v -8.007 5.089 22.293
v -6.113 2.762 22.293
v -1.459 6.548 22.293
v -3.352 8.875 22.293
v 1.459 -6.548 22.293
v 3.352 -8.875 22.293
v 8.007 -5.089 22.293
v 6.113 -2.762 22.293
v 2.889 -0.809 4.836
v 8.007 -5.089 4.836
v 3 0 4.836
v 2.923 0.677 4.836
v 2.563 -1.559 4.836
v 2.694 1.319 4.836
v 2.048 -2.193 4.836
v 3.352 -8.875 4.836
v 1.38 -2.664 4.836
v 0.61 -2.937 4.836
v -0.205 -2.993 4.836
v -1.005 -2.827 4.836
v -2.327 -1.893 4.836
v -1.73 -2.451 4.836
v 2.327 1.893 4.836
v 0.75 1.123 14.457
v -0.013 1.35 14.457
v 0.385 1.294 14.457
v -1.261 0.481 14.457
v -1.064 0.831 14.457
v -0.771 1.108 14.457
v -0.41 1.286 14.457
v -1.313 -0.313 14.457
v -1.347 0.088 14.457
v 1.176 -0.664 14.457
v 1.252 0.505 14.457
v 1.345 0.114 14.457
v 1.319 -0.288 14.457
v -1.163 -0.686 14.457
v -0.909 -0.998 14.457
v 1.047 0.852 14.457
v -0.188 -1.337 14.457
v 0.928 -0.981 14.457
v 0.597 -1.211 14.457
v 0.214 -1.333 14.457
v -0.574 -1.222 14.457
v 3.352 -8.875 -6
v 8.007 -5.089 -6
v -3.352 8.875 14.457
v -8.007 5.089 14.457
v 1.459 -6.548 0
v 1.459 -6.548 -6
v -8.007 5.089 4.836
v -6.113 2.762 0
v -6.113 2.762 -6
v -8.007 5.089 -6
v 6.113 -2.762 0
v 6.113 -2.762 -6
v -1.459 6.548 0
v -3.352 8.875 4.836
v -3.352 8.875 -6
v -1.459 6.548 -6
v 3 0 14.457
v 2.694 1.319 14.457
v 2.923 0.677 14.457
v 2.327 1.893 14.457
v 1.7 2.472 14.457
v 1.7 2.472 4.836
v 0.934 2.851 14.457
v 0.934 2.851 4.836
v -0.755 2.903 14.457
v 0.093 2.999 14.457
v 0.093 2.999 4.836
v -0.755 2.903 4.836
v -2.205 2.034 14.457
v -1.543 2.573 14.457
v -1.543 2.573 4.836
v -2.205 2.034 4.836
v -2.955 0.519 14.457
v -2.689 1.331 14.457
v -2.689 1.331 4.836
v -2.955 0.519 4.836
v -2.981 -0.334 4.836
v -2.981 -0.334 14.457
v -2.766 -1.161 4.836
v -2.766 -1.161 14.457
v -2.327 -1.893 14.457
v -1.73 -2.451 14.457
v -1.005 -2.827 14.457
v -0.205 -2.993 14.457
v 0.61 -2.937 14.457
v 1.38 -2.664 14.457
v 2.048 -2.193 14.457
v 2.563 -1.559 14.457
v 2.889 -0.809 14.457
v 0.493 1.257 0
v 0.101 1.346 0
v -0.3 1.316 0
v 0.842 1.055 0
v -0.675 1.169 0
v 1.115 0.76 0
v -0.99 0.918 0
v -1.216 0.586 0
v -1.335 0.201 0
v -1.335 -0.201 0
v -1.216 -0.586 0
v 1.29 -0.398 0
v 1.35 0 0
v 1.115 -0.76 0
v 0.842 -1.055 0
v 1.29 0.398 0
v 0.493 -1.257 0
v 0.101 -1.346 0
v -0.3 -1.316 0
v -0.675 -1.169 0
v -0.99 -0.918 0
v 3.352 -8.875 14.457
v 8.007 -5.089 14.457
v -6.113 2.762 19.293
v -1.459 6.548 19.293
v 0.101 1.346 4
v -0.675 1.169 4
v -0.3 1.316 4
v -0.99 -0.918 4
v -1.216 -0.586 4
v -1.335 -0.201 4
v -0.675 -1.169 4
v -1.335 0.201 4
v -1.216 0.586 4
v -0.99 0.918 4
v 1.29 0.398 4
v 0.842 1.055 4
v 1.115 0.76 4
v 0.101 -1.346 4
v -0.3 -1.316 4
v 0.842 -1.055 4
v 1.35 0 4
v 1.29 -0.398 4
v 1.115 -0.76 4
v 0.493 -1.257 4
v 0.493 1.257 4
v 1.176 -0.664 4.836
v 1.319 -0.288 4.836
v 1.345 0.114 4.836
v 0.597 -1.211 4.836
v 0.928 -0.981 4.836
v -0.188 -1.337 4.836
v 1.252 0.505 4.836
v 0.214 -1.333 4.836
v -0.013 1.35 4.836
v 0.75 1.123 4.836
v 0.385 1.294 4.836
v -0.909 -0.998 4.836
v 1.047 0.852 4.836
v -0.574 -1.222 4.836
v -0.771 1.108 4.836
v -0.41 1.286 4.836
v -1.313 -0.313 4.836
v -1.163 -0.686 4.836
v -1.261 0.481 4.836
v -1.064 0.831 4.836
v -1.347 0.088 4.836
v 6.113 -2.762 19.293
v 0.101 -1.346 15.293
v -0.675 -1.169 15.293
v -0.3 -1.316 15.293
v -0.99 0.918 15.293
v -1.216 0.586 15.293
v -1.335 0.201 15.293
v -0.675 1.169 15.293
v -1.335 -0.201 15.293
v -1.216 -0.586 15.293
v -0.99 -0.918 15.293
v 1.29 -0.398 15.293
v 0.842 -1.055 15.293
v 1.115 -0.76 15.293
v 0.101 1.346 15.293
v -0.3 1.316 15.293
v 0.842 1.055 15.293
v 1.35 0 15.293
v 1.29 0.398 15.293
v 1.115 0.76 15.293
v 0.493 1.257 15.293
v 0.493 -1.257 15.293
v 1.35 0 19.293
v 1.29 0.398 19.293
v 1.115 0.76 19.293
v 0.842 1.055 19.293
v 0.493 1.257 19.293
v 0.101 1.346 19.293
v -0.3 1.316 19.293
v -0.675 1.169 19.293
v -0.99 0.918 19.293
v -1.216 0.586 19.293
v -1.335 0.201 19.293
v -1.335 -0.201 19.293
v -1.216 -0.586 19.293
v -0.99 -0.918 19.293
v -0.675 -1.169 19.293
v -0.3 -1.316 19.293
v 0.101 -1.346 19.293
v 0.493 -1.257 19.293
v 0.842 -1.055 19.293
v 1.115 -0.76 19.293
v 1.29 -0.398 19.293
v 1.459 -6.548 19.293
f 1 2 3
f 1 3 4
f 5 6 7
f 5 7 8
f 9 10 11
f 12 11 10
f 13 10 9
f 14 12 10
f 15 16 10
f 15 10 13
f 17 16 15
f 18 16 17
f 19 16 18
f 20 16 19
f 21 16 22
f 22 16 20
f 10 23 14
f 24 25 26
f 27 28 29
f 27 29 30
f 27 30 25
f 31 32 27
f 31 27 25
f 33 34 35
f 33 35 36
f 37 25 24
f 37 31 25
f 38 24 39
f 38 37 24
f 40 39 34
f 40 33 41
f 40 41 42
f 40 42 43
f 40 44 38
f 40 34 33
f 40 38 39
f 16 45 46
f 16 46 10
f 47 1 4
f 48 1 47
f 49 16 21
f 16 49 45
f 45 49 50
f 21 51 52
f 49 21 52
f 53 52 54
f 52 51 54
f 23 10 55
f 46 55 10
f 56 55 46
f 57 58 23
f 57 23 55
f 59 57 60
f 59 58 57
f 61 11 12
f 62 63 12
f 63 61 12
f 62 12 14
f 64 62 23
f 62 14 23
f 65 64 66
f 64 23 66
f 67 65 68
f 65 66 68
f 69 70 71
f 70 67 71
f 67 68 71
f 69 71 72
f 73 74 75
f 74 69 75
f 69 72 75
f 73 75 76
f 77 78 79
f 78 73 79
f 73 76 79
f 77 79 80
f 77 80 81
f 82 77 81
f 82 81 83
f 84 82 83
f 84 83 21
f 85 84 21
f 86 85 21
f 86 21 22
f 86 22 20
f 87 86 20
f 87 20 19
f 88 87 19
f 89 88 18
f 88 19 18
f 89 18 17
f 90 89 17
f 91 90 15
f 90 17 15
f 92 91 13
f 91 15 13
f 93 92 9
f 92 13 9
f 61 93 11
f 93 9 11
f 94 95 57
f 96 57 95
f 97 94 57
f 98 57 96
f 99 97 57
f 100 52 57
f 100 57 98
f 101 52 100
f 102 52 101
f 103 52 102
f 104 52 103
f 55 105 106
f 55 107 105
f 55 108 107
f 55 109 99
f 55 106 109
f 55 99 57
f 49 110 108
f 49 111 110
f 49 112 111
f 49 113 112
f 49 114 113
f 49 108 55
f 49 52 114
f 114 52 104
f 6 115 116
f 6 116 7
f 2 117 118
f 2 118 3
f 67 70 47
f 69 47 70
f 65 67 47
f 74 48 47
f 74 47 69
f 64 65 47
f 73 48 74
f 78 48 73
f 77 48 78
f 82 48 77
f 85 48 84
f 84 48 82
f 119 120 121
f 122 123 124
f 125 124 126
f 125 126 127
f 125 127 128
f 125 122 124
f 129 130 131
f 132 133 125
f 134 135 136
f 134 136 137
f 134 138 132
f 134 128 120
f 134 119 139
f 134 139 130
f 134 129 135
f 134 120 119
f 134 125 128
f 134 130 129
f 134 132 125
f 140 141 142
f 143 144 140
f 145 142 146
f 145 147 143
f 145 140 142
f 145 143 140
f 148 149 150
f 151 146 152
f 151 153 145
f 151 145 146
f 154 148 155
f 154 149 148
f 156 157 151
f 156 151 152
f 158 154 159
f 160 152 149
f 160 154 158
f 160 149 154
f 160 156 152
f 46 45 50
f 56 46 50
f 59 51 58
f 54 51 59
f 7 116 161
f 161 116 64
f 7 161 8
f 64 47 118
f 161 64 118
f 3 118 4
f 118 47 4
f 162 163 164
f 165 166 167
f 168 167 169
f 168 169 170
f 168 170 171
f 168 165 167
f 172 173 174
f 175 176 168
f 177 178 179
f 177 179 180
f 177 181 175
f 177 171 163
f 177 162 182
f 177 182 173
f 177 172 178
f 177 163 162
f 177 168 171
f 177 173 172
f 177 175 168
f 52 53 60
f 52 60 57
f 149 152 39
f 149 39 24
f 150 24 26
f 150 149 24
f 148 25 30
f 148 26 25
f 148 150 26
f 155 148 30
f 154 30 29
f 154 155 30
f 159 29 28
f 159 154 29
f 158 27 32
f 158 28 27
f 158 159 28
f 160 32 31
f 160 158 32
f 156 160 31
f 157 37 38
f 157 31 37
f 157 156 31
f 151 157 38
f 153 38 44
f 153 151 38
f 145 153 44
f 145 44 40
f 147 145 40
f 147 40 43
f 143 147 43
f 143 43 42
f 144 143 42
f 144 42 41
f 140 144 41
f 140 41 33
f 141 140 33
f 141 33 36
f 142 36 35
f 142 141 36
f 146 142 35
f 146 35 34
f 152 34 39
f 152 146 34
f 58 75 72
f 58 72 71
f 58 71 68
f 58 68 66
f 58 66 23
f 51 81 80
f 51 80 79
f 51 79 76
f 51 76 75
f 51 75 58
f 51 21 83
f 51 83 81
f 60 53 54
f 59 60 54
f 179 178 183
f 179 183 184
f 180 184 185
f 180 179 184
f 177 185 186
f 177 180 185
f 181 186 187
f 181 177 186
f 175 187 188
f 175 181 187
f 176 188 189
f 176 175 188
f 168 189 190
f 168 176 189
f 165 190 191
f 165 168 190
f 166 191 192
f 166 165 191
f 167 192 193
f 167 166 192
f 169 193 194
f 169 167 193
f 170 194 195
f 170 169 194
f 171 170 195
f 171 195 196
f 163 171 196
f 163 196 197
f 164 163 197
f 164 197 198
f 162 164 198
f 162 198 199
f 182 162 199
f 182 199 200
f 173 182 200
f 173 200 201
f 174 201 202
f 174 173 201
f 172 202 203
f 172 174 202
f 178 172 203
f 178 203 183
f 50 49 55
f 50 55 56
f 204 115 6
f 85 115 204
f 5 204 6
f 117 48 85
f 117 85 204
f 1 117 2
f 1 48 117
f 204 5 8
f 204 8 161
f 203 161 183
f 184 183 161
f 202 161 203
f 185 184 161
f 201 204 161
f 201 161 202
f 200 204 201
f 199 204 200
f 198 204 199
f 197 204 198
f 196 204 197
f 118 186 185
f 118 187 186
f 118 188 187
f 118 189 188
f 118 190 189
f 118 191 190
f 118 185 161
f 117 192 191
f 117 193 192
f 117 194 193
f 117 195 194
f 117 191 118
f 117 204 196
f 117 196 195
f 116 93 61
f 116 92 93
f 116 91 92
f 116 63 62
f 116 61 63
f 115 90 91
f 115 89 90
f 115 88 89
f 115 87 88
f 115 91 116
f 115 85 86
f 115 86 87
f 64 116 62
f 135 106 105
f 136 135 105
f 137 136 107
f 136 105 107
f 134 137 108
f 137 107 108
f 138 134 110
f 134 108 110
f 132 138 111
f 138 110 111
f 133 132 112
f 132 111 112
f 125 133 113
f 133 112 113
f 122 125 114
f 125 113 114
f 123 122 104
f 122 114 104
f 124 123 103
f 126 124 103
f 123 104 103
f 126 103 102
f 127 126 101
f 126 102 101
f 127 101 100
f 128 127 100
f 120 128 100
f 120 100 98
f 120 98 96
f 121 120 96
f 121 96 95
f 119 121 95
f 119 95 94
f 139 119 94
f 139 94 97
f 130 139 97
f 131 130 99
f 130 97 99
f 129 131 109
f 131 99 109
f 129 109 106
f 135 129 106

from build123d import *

# Parameters (mm, degrees)
SKETCH1_R           = 3
SKETCH1_R_2         = 1.35
BOSS_EXTRUDE1_DEPTH = 19.293356838
BOSS_EXTRUDE2_DEPTH = 6
CUT_EXTRUDE1_START  = -4
SKETCH3_R           = 1.35
CUT_EXTRUDE1_DEPTH  = 4
SKETCH4_R           = 1.35
CUT_EXTRUDE2_DEPTH  = 4


with BuildPart() as part:
    # Sketch1 → Boss-Extrude1 (new body)
    with BuildSketch(Plane.XY):
        Circle(SKETCH1_R)
        with Locations(Location((0, 0, 0), (0, 0, 39.125701285))):
            Circle(SKETCH1_R_2, mode=Mode.SUBTRACT)
    extrude(amount=BOSS_EXTRUDE1_DEPTH)

    # Sketch2 → Boss-Extrude2 (add)
    with BuildSketch(Plane(origin=(-2.327290276, -1.89307157, 0), x_dir=(0, 0, 1), z_dir=(-0.7757634254674072, -0.6310238566861593, 0))):
        Polygon((14.457294983, 3), (14.457294983, -3), (14.457294983, -9), (19.293356838, -9), (22.293356838, -9), (22.293356838, -6), (19.293356838, -6), (19.293356838, -3), (19.293356838, 3), (19.293356838, 6), (22.293356838, 6), (22.293356838, 9), (19.293356838, 9), (14.457294983, 9), align=None)
        Polygon((0, -9), (-3, -9), (-6, -9), (-6, -6), (-3, -6), (0, -6), (0, -3), (0, 3), (0, 6), (-3, 6), (-6, 6), (-6, 9), (-3, 9), (0, 9), (4.836061855, 9), (4.836061855, 3), (4.836061855, -3), (4.836061855, -9), align=None)
    extrude(amount=-BOSS_EXTRUDE2_DEPTH)

    # Sketch3 → Cut-Extrude1 (cut)
    with BuildSketch(Plane.XY.offset(19.293356838).offset(CUT_EXTRUDE1_START)):
        Circle(SKETCH3_R)
    extrude(amount=CUT_EXTRUDE1_DEPTH, mode=Mode.SUBTRACT)

    # Sketch4 → Cut-Extrude2 (cut)
    with BuildSketch(Plane(origin=(0, 0, 0), x_dir=(-1, 0, 0), z_dir=(0, 0, -1))):
        with Locations(Location((0, 0, 0), (0, 0, 180))):
            Circle(SKETCH4_R)
    extrude(amount=-CUT_EXTRUDE2_DEPTH, mode=Mode.SUBTRACT)


solid = part.part
